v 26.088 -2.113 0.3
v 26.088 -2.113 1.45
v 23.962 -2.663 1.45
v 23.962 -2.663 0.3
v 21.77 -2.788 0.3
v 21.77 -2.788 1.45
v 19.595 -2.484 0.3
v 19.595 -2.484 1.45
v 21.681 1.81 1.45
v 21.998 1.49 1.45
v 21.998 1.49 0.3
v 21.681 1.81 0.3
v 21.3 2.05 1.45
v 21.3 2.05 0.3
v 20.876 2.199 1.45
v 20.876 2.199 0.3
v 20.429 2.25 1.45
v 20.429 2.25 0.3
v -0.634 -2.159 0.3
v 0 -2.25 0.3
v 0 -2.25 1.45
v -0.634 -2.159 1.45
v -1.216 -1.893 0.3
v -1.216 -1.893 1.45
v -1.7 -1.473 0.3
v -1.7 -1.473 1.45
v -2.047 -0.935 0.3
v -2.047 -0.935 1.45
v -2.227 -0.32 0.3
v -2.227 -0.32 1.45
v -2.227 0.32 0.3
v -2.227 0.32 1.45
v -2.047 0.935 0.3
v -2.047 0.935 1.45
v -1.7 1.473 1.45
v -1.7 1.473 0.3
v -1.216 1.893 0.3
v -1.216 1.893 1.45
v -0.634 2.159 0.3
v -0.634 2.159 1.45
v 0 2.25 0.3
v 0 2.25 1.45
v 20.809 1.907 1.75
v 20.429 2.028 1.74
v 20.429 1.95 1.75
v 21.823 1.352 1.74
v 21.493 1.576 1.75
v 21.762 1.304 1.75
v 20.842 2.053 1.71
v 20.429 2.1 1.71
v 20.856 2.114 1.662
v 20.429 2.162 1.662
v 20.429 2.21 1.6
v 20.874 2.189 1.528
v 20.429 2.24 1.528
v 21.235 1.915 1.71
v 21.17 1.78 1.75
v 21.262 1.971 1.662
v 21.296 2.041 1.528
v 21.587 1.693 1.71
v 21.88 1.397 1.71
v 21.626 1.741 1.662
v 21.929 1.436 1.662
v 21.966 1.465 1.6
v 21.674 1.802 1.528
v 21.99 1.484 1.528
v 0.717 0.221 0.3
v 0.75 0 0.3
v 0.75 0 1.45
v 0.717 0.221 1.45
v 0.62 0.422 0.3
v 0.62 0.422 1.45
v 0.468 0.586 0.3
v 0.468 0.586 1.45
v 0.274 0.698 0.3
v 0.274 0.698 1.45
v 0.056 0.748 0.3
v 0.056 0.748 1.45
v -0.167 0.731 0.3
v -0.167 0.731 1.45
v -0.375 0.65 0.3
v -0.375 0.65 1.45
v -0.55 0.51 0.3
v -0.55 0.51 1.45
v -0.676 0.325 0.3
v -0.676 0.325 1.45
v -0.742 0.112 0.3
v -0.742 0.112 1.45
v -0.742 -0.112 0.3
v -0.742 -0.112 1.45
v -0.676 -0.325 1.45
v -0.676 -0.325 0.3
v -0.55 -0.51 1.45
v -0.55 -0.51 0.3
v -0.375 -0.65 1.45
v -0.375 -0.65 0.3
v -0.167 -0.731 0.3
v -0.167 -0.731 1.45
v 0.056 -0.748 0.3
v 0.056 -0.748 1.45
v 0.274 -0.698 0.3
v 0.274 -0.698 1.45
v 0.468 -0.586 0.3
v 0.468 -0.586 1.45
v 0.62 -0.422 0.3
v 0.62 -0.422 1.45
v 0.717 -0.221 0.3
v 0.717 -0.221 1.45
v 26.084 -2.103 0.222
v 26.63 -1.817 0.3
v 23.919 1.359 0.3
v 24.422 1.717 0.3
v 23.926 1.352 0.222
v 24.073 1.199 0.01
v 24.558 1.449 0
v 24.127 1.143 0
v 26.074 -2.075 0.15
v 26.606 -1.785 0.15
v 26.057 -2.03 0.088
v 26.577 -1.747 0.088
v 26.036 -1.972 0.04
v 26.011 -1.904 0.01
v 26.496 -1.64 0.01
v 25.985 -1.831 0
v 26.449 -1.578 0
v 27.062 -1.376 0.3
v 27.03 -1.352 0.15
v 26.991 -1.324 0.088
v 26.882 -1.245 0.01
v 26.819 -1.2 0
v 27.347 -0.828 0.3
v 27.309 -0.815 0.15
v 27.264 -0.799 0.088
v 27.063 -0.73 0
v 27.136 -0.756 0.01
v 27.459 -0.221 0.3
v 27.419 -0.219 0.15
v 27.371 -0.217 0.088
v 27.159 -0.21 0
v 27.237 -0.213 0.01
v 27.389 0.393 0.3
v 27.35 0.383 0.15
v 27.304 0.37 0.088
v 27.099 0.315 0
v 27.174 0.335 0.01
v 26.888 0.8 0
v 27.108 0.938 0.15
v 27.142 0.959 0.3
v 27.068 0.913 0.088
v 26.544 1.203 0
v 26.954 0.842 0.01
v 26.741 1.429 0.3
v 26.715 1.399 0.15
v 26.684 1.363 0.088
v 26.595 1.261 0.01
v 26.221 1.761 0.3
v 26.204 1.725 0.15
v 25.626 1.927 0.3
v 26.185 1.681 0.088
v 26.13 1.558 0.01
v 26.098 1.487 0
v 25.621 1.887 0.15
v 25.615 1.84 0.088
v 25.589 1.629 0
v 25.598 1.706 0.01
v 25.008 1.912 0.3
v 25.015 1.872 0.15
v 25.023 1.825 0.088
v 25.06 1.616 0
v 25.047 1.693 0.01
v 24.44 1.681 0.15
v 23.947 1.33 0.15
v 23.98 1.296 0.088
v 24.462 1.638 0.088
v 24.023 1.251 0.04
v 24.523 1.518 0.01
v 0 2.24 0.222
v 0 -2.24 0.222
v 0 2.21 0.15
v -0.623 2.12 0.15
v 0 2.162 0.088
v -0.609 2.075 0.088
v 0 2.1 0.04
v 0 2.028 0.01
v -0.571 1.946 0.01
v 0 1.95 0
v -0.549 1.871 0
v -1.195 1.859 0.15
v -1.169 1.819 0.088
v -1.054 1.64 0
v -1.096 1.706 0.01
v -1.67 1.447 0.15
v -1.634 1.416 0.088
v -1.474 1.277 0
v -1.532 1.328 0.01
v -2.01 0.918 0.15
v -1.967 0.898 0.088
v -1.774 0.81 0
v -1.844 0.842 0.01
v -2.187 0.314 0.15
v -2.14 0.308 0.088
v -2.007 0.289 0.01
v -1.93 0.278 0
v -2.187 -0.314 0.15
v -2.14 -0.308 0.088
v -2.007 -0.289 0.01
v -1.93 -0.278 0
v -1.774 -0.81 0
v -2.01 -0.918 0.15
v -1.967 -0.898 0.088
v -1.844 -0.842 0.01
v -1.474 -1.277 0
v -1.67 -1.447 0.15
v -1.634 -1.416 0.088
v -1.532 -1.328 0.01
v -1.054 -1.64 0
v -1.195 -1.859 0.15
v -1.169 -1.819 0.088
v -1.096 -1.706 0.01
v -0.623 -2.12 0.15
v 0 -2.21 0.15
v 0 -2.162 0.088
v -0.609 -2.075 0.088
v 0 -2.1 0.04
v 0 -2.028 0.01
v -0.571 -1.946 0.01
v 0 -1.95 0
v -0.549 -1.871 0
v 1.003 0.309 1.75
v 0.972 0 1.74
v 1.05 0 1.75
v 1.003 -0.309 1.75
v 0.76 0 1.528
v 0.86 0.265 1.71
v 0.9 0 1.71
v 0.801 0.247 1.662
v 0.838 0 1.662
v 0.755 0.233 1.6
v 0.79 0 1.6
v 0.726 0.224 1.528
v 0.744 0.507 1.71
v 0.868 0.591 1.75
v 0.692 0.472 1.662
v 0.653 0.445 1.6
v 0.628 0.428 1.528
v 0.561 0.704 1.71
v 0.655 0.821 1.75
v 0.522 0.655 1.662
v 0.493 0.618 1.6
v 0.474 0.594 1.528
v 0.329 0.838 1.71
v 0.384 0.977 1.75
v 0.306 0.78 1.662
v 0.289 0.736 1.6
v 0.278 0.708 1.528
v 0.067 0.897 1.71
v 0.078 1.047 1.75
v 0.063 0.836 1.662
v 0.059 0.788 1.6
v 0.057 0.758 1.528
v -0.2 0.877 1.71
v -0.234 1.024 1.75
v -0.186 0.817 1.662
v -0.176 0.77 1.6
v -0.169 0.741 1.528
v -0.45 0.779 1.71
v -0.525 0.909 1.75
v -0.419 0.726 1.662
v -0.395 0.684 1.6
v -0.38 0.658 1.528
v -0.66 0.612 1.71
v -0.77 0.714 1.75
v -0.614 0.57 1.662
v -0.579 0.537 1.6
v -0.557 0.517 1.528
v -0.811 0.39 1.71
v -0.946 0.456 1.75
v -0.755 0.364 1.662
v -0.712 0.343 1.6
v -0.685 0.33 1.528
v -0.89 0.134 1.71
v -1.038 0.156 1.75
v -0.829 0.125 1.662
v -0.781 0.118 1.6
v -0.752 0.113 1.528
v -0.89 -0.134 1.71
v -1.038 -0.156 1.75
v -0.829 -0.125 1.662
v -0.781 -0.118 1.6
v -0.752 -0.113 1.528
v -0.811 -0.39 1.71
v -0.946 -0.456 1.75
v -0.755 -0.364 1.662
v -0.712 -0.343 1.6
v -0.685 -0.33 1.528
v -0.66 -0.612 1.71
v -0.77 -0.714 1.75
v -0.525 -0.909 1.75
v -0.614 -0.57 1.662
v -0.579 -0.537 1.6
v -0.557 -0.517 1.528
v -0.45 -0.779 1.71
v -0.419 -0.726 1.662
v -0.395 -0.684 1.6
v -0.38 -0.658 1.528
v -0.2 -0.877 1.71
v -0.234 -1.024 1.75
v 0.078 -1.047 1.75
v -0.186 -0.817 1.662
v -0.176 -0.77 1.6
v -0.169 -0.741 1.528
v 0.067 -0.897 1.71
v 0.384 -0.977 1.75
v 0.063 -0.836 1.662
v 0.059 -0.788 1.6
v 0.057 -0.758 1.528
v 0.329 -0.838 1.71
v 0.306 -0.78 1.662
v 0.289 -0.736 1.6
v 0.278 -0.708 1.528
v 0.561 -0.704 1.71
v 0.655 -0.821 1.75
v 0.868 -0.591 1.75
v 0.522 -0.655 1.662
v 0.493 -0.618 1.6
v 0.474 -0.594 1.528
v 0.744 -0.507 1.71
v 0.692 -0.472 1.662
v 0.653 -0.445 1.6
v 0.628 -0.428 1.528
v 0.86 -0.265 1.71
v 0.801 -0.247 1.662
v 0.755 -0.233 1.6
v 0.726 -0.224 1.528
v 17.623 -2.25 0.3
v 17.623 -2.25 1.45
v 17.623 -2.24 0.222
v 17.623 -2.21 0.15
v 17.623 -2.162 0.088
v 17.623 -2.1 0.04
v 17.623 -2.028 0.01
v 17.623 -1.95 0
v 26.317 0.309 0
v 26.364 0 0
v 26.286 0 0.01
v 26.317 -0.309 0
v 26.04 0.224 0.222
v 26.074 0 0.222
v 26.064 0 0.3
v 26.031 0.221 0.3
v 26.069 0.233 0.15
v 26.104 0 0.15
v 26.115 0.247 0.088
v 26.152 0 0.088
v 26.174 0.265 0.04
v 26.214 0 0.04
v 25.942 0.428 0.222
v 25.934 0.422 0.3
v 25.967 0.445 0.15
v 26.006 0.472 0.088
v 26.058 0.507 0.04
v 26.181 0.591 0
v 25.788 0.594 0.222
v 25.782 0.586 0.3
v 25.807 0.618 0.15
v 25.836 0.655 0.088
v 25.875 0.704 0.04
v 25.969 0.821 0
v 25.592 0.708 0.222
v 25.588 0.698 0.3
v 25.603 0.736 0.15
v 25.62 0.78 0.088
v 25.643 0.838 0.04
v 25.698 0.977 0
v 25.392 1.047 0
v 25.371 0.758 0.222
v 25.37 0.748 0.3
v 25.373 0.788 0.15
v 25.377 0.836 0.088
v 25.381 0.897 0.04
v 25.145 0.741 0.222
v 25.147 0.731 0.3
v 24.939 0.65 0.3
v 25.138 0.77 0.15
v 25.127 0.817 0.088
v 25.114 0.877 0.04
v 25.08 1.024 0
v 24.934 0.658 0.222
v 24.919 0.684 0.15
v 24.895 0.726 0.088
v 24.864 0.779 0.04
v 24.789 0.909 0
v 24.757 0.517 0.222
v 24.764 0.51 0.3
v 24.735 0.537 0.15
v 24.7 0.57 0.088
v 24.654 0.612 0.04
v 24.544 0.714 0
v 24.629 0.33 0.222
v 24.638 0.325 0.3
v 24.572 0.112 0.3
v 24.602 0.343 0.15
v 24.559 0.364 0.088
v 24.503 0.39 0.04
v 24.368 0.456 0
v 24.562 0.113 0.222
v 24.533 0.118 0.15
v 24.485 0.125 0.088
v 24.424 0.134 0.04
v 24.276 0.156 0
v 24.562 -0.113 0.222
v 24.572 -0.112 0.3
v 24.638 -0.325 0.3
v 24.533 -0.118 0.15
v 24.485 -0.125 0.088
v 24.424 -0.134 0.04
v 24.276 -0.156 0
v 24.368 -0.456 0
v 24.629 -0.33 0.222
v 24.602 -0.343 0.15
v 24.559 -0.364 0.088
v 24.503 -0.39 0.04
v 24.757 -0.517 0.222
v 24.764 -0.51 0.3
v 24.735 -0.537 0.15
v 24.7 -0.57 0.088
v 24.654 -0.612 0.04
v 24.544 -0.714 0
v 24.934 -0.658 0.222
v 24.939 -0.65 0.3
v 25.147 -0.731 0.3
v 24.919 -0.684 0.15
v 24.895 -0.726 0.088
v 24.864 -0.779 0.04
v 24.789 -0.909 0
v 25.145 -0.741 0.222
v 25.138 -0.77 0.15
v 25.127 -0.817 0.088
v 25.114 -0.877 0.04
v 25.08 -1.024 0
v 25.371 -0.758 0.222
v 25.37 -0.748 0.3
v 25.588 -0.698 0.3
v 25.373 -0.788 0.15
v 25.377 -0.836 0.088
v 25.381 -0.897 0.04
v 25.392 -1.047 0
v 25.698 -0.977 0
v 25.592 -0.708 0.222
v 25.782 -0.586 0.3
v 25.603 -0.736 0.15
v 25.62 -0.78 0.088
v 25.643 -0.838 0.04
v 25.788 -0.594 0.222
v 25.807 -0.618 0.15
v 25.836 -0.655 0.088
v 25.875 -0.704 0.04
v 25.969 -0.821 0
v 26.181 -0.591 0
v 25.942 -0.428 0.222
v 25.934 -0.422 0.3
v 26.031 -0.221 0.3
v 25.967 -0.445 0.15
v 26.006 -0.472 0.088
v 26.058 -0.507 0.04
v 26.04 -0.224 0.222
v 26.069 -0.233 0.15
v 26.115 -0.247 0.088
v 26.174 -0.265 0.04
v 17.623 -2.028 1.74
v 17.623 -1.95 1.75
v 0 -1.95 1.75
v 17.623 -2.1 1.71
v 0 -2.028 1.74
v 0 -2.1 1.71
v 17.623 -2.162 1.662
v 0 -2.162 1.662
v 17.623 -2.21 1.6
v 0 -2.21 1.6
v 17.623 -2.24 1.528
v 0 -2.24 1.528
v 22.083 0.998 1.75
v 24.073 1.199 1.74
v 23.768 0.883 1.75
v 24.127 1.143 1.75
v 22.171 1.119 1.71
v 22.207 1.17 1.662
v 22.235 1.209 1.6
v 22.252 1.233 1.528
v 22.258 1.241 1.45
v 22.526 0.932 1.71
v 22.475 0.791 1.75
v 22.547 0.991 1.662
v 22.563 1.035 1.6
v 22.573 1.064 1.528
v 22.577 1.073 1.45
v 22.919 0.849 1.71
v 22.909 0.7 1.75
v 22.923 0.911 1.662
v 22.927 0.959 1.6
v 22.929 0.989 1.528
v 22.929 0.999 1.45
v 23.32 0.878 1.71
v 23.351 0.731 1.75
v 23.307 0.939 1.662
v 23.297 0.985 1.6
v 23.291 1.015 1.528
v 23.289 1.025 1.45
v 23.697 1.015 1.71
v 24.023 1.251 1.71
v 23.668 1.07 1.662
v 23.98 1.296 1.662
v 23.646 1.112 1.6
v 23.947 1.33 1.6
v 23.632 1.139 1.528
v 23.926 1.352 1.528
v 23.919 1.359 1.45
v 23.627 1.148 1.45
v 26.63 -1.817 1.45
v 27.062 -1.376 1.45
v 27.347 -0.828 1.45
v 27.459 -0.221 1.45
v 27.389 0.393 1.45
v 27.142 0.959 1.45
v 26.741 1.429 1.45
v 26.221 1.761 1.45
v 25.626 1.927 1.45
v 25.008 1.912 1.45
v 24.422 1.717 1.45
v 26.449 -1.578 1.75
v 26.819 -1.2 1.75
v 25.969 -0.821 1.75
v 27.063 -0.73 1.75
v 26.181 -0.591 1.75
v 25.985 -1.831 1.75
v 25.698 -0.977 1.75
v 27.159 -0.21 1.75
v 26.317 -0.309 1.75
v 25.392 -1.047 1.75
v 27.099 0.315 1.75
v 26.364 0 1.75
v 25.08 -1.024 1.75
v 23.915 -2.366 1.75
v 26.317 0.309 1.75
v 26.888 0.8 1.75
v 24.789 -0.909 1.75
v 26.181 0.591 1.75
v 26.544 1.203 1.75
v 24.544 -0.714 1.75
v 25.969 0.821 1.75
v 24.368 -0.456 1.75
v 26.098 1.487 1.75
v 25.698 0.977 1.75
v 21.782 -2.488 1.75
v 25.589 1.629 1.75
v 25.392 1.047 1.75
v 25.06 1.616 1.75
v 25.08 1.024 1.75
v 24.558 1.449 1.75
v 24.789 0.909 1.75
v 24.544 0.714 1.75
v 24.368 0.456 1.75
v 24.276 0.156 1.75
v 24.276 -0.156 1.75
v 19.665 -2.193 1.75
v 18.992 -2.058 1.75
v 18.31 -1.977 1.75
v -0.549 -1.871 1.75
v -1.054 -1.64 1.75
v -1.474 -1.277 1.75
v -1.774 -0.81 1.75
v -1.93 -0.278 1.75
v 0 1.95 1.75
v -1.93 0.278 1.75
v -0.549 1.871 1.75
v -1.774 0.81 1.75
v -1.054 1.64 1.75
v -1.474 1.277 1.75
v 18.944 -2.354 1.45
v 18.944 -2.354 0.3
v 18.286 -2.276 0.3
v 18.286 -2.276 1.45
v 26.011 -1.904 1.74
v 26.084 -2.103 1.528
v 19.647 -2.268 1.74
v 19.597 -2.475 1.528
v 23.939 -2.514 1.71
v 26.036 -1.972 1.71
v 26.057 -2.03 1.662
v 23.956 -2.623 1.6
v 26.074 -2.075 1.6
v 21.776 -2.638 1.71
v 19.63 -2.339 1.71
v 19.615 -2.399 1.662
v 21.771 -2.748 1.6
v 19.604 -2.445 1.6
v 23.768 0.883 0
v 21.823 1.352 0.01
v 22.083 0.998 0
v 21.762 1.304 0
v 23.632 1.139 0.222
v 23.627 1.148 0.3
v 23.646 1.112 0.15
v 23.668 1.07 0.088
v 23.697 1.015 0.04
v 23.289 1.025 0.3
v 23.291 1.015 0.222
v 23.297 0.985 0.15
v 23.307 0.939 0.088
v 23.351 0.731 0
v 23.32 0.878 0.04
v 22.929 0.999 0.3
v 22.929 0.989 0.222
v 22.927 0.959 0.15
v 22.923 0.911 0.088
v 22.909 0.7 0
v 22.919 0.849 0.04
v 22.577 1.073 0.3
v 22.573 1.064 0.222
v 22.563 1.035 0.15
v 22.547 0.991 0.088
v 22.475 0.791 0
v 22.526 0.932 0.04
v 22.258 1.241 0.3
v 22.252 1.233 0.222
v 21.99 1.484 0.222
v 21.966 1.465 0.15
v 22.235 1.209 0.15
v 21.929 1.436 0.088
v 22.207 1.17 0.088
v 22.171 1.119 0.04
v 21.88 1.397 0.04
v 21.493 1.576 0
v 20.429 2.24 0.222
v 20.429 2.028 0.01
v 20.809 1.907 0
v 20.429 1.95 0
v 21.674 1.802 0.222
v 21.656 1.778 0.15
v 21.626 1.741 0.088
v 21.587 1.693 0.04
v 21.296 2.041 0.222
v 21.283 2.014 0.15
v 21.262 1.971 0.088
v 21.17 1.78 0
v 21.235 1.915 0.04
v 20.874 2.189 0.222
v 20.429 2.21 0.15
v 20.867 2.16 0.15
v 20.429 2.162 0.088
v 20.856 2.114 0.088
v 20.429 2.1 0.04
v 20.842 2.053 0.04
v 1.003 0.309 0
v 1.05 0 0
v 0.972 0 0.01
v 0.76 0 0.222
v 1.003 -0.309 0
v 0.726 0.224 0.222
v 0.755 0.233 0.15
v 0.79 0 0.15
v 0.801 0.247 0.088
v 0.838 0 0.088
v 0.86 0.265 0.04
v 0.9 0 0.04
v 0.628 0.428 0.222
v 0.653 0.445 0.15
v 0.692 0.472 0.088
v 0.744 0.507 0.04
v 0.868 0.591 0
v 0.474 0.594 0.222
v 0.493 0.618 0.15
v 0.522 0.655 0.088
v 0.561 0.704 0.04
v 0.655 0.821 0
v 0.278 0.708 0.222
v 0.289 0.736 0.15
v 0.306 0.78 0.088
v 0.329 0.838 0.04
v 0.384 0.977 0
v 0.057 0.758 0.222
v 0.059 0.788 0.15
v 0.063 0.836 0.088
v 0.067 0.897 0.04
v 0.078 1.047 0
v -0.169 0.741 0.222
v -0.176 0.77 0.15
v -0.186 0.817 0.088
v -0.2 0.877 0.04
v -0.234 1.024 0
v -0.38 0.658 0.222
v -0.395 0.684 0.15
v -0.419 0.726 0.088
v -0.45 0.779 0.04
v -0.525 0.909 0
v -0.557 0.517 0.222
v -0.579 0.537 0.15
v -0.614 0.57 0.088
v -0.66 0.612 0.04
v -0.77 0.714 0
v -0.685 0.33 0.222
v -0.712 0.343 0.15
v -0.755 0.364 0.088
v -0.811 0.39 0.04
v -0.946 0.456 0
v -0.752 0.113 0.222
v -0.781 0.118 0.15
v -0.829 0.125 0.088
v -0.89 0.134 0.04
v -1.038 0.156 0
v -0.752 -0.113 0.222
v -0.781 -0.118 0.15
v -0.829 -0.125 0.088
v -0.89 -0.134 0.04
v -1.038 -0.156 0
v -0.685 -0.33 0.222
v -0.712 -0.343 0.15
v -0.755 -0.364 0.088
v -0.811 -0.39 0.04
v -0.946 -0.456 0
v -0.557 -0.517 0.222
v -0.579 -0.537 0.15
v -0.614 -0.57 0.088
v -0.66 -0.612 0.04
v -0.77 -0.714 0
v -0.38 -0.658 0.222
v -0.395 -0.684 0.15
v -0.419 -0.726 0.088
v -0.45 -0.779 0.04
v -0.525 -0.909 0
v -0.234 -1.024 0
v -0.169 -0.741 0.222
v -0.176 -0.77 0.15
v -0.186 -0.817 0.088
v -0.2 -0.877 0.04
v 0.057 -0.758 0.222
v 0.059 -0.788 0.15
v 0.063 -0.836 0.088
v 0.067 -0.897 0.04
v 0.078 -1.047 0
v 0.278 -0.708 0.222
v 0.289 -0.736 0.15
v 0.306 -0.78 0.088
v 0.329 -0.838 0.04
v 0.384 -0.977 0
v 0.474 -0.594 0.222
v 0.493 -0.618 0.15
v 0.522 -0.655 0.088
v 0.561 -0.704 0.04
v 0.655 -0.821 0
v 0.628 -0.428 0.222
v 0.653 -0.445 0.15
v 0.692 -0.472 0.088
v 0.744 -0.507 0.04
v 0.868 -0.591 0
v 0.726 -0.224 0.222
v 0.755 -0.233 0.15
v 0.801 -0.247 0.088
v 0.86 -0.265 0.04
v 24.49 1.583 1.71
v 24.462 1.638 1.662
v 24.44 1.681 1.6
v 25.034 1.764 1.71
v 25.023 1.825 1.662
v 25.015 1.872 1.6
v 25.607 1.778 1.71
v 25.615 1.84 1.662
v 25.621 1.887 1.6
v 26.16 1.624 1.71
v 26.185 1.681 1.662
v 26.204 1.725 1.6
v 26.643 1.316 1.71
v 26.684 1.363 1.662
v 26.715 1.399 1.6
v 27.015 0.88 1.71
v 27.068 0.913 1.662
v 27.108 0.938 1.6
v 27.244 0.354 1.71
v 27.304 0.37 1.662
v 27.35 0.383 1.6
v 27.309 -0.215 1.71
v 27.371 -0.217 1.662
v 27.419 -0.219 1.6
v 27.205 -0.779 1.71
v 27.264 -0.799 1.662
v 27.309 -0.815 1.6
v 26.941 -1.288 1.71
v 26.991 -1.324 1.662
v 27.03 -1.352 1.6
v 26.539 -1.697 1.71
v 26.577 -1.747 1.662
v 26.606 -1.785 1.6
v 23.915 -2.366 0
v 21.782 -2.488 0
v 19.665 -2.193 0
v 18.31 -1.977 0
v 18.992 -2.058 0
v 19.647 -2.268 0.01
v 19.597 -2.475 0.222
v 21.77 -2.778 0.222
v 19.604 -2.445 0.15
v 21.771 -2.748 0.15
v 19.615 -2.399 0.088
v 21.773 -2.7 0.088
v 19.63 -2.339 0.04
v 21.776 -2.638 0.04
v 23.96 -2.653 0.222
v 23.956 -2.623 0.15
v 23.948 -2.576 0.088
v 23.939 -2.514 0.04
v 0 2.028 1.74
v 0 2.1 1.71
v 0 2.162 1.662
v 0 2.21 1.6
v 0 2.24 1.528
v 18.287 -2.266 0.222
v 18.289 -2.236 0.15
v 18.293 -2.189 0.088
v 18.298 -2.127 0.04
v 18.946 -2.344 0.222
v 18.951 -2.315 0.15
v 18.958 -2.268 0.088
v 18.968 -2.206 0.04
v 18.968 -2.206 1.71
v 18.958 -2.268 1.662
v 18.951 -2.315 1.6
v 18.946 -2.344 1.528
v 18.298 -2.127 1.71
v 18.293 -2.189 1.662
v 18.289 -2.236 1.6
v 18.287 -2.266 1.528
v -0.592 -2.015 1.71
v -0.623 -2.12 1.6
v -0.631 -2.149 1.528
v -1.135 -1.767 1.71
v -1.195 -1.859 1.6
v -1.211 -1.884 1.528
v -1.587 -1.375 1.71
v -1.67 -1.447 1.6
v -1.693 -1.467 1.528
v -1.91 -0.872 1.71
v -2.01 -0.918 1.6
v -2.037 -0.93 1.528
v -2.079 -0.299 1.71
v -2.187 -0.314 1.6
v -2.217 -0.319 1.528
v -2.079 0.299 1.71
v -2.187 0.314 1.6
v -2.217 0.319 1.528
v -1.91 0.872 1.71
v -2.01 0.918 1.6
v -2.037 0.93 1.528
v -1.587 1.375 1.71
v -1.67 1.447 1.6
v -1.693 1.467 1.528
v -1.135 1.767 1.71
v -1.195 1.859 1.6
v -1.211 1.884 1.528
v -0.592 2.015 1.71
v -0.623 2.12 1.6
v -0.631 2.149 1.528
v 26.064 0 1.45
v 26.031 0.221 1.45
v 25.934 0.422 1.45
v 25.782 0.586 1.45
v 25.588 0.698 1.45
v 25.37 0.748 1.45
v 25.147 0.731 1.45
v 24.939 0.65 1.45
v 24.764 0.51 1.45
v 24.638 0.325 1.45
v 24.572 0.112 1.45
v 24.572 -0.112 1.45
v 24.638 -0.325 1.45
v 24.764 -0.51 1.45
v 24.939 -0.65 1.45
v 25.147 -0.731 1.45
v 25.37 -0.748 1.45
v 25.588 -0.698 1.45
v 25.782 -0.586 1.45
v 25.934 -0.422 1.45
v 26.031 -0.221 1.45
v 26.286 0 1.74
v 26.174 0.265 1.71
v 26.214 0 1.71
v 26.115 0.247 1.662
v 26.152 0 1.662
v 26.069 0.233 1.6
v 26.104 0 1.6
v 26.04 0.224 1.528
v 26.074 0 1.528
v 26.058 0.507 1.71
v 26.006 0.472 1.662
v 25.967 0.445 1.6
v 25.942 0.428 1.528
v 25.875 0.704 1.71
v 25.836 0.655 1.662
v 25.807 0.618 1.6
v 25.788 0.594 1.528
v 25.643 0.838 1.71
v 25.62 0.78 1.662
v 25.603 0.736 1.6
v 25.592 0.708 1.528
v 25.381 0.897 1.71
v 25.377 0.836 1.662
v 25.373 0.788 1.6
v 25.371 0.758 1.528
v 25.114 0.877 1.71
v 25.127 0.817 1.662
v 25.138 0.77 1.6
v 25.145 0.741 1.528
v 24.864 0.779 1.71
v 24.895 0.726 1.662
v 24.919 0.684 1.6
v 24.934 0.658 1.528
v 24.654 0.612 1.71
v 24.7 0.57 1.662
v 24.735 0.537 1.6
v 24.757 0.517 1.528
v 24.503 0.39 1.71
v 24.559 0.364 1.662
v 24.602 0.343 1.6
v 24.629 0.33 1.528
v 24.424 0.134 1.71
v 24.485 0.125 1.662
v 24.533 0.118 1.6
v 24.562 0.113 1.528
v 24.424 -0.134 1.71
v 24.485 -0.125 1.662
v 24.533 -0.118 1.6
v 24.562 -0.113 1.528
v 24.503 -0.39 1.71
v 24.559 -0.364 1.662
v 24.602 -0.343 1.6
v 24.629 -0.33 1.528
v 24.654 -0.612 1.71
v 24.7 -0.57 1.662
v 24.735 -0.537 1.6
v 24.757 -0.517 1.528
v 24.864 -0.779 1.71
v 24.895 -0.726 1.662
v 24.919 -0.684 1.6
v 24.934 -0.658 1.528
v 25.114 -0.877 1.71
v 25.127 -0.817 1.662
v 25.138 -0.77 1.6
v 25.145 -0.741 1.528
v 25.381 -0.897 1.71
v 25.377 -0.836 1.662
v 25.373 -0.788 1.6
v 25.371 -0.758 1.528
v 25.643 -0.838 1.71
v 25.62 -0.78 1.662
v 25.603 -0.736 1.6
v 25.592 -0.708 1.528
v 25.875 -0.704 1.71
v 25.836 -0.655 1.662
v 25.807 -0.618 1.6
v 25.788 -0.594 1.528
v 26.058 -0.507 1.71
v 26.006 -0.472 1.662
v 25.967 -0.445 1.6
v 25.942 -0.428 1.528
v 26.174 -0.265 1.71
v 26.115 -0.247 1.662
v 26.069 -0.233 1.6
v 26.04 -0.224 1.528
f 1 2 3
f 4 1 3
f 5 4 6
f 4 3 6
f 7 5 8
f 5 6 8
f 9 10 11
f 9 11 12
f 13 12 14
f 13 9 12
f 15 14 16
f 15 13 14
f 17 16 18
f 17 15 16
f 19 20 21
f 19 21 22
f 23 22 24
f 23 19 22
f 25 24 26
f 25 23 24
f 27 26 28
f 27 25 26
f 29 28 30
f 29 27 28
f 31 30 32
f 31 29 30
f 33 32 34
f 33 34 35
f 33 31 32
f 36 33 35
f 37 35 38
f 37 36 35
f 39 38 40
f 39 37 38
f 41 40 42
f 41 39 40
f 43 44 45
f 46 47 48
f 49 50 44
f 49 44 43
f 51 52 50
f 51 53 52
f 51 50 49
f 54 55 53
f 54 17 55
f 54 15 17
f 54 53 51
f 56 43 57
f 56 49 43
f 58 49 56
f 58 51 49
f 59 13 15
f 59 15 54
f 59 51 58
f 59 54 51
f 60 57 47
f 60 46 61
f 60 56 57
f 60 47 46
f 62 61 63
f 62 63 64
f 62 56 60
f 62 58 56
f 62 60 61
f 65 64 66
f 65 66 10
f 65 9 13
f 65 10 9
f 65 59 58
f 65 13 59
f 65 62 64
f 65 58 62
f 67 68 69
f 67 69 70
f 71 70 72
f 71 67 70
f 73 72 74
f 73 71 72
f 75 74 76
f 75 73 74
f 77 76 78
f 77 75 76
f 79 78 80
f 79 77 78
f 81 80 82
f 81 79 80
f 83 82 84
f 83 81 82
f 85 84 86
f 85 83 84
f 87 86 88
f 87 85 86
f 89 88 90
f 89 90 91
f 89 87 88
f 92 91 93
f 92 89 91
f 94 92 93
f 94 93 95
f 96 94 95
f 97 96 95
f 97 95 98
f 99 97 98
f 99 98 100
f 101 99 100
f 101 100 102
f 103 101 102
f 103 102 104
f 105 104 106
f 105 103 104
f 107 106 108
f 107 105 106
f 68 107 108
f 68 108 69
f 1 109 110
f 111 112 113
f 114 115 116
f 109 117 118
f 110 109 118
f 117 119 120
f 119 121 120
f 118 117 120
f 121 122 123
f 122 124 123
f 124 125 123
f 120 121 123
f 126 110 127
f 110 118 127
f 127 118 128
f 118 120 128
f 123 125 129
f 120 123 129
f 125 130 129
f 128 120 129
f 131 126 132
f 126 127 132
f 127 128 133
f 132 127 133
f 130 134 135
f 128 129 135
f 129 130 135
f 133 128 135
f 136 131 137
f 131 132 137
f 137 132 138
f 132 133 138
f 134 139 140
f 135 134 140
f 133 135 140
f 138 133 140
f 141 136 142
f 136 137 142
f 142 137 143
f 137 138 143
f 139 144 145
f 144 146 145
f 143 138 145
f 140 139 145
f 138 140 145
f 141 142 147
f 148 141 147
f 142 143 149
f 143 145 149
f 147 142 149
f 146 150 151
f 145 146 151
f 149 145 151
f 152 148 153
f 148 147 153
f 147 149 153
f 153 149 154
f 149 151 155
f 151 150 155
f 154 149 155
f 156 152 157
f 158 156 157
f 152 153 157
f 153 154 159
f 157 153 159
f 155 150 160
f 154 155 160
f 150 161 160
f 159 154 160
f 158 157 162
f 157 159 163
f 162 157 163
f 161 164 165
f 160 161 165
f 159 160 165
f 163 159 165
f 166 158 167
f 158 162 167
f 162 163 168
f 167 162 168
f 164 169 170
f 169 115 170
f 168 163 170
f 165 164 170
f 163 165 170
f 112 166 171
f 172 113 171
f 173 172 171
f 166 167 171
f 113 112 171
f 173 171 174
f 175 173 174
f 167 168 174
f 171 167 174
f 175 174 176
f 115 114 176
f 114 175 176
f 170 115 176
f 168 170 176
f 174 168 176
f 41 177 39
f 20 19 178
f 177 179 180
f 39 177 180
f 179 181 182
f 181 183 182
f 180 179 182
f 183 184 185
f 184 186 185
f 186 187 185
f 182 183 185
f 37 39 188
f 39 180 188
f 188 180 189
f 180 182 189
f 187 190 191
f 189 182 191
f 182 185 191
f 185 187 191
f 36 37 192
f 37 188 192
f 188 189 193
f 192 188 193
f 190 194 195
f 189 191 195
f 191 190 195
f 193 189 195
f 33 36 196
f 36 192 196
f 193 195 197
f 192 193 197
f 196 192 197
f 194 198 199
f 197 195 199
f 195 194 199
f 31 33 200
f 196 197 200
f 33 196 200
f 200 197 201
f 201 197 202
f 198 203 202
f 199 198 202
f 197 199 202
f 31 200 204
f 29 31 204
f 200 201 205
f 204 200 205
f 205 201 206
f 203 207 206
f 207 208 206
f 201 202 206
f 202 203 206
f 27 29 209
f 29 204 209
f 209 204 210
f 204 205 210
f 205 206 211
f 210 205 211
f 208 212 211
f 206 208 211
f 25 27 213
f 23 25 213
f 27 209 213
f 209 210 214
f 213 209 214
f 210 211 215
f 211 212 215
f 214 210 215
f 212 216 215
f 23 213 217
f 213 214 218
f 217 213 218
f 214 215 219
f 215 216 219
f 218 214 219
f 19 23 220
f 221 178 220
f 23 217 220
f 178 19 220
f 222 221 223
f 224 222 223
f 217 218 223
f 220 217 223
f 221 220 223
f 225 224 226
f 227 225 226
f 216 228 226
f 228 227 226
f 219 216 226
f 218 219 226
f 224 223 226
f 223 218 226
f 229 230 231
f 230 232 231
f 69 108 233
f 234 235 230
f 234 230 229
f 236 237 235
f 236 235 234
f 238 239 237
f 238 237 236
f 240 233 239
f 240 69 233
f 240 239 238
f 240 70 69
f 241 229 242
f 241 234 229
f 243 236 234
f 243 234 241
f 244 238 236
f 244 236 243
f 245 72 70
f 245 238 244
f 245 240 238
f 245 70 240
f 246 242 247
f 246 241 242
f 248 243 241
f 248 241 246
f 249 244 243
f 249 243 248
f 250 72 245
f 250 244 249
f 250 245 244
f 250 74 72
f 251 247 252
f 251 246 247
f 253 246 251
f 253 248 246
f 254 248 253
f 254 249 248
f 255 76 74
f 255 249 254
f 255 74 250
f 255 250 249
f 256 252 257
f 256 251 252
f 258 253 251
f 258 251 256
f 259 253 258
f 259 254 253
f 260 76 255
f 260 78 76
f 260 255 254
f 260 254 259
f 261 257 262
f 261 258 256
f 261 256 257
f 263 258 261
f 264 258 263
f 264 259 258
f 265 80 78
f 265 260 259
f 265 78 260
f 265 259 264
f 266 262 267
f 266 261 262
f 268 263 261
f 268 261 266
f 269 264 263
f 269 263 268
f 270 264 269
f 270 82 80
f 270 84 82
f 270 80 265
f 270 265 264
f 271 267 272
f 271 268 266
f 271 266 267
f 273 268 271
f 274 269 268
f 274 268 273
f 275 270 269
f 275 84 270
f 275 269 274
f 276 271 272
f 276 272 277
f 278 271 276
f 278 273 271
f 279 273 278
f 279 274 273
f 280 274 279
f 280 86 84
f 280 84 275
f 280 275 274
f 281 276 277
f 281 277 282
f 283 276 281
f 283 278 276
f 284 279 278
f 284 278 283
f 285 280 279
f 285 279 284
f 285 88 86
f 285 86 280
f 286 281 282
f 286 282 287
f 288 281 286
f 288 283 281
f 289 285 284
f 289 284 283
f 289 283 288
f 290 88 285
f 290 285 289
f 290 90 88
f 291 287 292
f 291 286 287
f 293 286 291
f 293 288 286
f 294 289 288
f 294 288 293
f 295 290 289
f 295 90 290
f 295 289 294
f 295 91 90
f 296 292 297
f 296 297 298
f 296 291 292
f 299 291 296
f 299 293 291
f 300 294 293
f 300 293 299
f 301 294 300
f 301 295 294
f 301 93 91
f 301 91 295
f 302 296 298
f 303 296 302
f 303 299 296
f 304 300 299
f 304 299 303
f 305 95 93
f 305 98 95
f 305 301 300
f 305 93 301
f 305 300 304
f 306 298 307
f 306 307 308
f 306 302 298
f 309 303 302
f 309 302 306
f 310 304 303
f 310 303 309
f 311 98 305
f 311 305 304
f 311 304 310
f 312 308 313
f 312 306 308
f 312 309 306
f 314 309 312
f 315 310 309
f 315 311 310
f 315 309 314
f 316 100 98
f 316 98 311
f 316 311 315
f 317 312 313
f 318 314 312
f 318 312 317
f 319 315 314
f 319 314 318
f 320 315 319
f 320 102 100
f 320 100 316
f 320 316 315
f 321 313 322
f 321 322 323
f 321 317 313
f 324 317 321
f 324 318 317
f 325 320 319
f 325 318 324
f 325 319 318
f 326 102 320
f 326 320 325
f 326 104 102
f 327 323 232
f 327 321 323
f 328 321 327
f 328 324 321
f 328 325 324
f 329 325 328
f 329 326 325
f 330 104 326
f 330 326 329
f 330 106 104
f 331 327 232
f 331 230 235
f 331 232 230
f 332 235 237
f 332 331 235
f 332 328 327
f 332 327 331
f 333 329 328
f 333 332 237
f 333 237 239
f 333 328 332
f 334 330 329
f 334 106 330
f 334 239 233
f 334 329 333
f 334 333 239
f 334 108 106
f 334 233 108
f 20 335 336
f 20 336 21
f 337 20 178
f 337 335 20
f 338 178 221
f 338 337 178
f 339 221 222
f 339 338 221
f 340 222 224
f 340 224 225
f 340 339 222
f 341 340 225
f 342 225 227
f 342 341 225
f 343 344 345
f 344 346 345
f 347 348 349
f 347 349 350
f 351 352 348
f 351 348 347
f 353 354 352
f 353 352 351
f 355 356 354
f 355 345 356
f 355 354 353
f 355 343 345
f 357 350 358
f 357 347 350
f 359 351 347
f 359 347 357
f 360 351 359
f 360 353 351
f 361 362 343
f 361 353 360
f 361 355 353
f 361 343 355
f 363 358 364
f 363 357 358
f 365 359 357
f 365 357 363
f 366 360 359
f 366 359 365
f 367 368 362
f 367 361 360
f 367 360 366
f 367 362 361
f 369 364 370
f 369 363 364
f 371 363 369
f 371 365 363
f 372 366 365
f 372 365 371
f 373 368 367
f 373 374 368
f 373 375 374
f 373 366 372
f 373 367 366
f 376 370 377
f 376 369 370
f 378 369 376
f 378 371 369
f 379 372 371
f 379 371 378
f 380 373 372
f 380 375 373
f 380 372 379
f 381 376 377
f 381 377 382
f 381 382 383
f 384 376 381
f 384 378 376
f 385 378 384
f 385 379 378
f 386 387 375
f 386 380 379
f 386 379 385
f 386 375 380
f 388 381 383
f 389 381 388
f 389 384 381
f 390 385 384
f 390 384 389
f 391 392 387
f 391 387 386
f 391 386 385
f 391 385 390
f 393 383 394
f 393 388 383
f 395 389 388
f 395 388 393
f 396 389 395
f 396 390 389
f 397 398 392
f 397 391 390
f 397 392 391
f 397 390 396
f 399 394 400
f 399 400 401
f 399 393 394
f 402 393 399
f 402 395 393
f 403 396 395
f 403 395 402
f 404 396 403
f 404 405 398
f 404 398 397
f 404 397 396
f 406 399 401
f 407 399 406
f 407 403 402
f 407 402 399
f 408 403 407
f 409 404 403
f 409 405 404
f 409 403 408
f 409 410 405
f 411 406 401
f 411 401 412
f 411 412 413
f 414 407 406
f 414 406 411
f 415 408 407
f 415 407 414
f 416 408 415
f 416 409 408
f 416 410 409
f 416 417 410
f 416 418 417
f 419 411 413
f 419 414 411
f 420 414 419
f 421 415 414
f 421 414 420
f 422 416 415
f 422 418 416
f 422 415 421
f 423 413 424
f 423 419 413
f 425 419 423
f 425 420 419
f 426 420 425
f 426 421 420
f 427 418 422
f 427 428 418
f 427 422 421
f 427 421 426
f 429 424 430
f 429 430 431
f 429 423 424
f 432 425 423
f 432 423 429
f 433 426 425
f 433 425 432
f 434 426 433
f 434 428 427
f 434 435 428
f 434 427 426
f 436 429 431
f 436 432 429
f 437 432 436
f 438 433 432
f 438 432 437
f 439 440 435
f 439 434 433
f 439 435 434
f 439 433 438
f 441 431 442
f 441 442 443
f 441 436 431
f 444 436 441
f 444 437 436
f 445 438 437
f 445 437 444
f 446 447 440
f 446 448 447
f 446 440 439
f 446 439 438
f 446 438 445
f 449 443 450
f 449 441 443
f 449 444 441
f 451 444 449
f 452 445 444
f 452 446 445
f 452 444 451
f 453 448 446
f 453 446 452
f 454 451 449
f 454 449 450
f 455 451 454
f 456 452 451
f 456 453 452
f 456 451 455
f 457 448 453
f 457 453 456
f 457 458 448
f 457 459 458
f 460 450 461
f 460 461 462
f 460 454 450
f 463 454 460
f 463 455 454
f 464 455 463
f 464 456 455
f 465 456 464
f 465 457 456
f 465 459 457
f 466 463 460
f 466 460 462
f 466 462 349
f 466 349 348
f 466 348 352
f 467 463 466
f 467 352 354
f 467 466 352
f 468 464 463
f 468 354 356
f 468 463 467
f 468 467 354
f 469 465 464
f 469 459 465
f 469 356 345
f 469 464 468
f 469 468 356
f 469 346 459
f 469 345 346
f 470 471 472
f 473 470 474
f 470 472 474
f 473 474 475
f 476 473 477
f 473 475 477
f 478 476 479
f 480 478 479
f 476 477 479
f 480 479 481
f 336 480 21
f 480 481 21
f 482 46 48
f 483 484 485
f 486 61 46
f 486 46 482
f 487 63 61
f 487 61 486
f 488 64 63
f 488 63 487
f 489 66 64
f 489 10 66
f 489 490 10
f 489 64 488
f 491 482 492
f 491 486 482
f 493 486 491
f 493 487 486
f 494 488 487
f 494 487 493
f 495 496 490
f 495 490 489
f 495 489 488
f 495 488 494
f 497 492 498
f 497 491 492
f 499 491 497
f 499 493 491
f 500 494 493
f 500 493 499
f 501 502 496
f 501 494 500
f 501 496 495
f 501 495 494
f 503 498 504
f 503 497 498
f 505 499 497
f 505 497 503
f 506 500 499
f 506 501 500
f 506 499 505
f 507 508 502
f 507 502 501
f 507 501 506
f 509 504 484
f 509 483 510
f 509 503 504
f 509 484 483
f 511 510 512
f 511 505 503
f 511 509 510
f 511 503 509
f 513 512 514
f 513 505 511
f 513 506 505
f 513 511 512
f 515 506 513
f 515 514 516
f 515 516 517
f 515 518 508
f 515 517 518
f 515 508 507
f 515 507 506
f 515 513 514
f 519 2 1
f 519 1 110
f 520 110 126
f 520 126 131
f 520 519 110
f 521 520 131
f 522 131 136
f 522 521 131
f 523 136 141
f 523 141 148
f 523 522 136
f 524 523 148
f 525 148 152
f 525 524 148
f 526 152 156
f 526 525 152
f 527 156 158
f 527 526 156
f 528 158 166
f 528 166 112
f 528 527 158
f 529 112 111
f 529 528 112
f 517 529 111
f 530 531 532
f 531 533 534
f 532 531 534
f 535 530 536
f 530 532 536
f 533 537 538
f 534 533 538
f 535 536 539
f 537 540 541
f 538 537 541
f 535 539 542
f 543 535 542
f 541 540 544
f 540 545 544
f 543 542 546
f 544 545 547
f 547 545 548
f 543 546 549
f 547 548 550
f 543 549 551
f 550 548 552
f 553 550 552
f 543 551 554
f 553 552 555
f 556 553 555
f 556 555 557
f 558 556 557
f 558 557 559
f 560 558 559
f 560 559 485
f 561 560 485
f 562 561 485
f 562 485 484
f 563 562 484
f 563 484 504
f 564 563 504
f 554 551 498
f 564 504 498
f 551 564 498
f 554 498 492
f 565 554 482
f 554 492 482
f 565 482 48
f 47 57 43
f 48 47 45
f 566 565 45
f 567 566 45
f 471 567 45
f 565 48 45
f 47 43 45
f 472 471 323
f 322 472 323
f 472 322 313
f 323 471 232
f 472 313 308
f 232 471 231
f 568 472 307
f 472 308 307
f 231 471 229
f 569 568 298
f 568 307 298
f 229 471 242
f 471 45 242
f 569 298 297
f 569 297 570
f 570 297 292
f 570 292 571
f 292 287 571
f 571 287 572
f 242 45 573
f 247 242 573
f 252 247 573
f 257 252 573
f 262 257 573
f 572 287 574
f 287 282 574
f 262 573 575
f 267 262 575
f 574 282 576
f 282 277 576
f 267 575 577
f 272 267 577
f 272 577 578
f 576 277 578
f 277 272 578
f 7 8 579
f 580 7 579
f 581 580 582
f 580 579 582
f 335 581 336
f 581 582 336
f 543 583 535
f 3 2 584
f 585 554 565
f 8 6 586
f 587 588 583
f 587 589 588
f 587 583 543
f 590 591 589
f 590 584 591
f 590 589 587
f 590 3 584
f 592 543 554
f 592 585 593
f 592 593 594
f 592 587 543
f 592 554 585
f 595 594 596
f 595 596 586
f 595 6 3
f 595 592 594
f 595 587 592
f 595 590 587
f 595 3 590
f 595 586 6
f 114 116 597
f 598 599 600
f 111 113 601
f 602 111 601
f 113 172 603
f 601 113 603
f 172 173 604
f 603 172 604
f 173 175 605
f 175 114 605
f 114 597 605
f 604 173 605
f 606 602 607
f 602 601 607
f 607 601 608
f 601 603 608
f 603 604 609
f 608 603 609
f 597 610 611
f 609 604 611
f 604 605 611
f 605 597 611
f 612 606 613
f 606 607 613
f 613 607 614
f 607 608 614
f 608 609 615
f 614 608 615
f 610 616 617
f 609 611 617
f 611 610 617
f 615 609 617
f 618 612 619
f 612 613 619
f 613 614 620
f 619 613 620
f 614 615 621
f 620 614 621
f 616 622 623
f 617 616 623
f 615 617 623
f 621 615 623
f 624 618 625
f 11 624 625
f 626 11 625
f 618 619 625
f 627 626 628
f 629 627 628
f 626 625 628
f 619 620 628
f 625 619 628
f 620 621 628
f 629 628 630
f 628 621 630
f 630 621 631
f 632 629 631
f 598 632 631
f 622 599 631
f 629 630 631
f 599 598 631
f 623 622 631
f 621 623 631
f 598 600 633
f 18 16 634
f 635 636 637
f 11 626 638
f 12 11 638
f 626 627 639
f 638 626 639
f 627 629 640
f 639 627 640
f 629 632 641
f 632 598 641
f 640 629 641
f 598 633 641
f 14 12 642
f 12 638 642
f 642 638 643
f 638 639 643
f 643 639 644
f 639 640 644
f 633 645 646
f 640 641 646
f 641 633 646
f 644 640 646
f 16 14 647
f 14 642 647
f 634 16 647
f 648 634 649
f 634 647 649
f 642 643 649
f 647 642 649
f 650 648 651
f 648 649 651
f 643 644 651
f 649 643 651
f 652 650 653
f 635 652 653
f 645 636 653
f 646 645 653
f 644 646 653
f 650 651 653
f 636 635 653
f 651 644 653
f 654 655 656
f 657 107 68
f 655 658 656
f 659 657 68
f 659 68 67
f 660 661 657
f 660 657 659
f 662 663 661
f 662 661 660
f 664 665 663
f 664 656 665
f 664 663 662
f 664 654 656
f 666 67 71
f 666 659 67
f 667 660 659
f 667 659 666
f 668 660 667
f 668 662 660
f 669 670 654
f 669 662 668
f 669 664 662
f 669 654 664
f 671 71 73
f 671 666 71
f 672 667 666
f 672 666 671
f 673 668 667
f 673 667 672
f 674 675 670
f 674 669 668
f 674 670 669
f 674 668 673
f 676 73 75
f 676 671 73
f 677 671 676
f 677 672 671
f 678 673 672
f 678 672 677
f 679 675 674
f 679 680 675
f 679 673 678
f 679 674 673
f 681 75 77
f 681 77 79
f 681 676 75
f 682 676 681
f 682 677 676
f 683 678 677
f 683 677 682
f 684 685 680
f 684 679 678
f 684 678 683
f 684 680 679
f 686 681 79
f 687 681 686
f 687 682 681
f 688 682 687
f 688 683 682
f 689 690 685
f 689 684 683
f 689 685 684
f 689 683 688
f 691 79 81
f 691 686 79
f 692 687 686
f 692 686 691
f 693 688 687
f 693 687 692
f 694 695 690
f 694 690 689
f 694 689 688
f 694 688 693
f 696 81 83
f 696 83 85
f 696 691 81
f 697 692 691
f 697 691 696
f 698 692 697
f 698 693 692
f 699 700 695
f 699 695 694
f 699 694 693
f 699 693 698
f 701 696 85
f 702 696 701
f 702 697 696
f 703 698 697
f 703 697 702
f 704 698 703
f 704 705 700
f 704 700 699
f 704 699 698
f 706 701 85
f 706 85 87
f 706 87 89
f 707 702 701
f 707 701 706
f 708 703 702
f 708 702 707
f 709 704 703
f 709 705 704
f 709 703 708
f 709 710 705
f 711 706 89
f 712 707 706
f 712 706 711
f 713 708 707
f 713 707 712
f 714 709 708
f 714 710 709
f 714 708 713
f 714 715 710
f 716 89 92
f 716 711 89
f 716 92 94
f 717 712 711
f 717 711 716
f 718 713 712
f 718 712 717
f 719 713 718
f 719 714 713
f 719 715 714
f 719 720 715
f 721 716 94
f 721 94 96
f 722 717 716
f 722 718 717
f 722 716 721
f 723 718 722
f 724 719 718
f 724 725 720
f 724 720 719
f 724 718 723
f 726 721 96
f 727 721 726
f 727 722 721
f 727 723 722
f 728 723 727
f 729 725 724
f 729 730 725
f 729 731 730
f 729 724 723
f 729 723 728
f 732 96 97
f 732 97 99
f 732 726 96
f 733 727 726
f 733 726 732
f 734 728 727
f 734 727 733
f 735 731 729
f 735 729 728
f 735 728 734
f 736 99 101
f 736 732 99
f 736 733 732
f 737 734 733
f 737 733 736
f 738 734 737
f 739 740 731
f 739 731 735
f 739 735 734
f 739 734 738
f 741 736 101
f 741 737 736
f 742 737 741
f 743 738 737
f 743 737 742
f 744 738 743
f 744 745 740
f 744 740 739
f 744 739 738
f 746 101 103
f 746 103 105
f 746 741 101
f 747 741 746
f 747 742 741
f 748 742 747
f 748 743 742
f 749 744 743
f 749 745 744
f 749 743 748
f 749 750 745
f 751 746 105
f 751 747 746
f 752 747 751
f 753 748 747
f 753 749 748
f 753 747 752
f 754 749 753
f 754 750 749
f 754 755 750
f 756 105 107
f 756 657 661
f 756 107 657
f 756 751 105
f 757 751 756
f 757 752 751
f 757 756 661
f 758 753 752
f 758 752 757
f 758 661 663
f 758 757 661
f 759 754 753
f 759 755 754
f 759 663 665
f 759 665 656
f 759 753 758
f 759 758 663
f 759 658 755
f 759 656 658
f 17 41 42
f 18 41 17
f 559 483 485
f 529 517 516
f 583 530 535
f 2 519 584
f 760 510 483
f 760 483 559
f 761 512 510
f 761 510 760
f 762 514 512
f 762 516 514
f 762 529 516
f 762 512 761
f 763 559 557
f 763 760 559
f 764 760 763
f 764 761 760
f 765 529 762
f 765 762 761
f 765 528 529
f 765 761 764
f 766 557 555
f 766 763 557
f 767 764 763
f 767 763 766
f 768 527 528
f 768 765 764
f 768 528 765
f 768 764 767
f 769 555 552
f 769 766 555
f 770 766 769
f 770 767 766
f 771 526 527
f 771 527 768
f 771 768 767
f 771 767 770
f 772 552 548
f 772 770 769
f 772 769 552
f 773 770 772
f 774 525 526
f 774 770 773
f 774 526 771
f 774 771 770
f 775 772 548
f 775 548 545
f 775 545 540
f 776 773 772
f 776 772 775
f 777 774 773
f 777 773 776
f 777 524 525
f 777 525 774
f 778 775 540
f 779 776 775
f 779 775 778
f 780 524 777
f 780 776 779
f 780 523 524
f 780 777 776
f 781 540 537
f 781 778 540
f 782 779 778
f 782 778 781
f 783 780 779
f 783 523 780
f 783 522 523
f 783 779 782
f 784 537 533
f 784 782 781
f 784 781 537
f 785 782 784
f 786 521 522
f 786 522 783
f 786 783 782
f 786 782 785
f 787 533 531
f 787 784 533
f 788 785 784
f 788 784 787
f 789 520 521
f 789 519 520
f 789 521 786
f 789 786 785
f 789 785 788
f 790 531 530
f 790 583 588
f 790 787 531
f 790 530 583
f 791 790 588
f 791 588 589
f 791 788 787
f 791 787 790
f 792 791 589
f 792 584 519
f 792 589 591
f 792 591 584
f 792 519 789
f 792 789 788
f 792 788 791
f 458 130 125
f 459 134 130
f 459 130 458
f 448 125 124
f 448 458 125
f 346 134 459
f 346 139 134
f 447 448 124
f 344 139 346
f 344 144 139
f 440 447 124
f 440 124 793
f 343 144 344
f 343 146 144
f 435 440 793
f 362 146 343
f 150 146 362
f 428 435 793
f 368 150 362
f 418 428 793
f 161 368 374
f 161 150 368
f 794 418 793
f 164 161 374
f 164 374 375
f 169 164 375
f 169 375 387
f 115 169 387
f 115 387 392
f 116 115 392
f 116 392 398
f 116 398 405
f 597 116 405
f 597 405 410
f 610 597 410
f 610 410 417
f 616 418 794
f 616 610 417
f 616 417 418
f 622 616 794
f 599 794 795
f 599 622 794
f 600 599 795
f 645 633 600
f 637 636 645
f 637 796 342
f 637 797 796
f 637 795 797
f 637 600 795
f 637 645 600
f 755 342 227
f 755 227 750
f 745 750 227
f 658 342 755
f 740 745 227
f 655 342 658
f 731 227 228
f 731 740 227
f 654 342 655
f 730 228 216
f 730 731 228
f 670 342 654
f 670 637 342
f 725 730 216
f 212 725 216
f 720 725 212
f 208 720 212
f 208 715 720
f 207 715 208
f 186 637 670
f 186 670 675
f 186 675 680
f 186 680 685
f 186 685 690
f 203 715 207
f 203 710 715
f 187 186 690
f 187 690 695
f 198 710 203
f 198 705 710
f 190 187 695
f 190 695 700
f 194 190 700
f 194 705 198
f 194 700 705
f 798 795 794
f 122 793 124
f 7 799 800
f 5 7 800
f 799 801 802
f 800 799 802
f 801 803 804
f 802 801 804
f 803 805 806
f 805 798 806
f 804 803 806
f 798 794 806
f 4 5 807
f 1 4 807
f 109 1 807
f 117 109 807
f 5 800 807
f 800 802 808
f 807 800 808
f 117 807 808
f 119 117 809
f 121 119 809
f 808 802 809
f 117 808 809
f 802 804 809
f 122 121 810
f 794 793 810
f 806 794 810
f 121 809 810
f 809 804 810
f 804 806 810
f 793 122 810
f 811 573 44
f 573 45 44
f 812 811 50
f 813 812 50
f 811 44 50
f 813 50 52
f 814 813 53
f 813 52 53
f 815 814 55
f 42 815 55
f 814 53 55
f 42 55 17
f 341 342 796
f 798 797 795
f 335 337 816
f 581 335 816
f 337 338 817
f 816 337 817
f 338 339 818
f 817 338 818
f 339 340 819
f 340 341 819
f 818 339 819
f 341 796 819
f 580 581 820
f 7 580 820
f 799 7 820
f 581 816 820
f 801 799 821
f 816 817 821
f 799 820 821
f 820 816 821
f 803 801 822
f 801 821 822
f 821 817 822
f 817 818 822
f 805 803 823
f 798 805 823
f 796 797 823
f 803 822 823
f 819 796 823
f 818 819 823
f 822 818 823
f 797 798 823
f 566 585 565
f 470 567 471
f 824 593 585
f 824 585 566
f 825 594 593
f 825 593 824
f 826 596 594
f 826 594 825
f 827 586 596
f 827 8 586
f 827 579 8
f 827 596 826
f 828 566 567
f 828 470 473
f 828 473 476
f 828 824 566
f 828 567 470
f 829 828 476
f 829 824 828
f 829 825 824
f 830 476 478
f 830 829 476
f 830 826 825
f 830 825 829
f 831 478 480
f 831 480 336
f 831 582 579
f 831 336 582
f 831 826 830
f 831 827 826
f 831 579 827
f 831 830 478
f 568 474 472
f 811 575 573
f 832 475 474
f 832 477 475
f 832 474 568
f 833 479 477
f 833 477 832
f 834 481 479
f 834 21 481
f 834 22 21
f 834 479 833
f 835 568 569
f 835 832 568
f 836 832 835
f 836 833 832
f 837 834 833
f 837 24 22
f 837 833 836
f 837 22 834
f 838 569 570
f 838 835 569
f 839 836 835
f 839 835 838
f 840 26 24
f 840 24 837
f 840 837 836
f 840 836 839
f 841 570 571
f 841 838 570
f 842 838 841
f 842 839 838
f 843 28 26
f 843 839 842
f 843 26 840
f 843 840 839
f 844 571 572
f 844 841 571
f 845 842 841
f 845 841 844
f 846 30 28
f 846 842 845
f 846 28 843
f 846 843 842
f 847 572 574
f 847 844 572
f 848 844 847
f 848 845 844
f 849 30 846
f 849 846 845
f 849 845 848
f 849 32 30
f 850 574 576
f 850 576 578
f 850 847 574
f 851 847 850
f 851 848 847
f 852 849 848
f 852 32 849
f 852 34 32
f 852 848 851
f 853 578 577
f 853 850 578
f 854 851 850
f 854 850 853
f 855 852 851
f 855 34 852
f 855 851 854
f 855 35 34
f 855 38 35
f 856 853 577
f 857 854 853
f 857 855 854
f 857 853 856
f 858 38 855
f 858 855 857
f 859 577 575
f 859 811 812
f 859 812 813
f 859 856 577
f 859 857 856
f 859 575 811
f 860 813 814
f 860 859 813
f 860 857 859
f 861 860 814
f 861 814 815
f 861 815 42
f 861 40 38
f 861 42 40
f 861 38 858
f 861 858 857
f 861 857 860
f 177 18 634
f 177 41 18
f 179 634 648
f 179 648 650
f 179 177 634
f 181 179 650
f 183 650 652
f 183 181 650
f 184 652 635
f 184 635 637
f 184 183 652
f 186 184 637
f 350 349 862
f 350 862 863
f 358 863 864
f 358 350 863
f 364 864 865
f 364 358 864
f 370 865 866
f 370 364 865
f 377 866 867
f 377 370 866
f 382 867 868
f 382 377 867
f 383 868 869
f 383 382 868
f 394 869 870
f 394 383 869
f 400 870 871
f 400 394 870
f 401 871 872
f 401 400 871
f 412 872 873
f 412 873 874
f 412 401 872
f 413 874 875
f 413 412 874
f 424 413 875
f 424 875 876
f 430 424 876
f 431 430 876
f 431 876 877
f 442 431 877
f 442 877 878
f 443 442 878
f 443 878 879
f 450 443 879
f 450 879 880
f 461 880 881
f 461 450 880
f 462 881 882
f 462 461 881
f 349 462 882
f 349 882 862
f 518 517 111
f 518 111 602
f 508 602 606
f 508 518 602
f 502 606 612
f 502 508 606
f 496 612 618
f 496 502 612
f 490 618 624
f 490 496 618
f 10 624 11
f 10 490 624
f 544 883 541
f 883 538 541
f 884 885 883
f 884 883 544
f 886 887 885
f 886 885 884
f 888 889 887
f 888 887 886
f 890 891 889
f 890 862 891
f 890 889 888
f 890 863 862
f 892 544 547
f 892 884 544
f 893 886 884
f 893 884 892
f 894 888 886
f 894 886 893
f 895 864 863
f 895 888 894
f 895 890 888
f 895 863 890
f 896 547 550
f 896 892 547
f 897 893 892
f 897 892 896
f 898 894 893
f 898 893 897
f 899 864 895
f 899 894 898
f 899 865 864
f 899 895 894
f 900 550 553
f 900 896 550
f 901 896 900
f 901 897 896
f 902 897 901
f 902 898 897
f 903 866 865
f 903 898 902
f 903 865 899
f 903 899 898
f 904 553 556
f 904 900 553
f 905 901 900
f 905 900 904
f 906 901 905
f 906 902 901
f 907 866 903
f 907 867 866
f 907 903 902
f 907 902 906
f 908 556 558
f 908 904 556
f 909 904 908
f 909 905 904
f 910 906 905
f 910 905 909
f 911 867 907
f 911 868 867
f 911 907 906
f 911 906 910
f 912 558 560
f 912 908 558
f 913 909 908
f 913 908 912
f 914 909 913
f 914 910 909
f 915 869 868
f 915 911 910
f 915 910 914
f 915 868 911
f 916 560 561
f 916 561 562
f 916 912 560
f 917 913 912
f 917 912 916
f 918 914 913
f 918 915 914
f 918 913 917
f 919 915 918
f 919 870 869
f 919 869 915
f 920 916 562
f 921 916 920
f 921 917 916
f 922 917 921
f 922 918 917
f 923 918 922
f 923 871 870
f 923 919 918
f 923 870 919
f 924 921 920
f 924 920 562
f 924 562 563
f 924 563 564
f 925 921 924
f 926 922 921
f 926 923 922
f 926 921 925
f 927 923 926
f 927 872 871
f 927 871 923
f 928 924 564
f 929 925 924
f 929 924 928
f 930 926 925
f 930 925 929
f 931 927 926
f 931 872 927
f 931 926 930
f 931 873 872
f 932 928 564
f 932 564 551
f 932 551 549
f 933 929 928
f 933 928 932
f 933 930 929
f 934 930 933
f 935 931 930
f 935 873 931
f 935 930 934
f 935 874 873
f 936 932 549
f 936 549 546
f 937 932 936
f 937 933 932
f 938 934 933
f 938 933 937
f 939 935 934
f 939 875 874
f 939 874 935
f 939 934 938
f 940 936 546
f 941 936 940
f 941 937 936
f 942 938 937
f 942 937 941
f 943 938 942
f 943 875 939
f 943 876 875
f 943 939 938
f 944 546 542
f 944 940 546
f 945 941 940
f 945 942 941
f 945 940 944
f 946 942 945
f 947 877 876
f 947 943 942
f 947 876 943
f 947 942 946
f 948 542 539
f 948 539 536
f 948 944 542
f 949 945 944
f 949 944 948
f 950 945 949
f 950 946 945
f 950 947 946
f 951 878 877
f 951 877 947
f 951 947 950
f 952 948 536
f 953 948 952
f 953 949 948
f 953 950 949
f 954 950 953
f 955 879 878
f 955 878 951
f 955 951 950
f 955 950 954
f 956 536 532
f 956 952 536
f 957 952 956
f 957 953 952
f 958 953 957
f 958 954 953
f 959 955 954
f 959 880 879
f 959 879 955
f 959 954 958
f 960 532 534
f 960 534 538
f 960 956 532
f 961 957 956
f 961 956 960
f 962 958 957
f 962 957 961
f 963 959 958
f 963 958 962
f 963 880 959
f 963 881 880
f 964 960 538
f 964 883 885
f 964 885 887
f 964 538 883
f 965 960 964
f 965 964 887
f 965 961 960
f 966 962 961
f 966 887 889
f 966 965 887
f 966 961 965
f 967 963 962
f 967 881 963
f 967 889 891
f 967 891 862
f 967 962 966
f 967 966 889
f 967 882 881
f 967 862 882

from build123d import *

# Parameters (mm, degrees)
SKETCH1_R           = 0.75
BOSS_EXTRUDE1_DEPTH = 1.75
CUT_EXTRUDE1_DEPTH  = 2.75
BOSS_EXTRUDE2_DEPTH = 1.75
FILLET1_R           = 0.3


with BuildPart() as part:
    # Sketch1 → Boss-Extrude1 (new body)
    with BuildSketch(Plane.XY):
        with BuildLine():
            Line((0, 2.25), (25.3139123, 2.25))
            ThreePointArc((25.3139123, 2.25), (27.5639123, 0), (25.3139123, -2.25))
            Line((25.3139123, -2.25), (0, -2.25))
            ThreePointArc((0, -2.25), (-2.25, 0), (0, 2.25))
        make_face()
        Circle(SKETCH1_R, mode=Mode.SUBTRACT)
        with Locations((25.3139123, 0)):
            Circle(SKETCH1_R, mode=Mode.SUBTRACT)
    extrude(amount=BOSS_EXTRUDE1_DEPTH)

    # Sketch3 → Cut-Extrude1 (cut, through all)
    with BuildSketch(Plane.XY.offset(1.75)):
        with BuildLine():
            Line((20.428705222, 2.25), (19.342677146, 2.25))
            Line((19.342677146, 2.25), (23.387436759, 7.422260387))
            Line((23.387436759, 7.422260387), (32.371586903, 3.422864517))
            Line((32.371586903, 3.422864517), (28.657239067, -4.174979021))
            Line((28.657239067, -4.174979021), (25.048377489, -2.234276452))
            ThreePointArc((25.048377489, -2.234276452), (25.575200601, -2.234777041), (26.087699031, -2.112759829))
            ThreePointArc((26.087699031, -2.112759829), (27.142254835, 0.959406624), (23.918802571, 1.358969087))
            ThreePointArc((23.918802571, 1.358969087), (22.929300966, 0.999117226), (21.997860665, 1.490060964))
            ThreePointArc((21.997860665, 1.490060964), (21.300450044, 2.050016934), (20.428705222, 2.25))
        make_face()
    extrude(amount=-CUT_EXTRUDE1_DEPTH, mode=Mode.SUBTRACT)

    # Sketch4 → Boss-Extrude2 (add)
    with BuildSketch(Plane.XY.offset(1.75)):
        with BuildLine():
            Line((17.62318329, -2.25), (26.087699031, -2.112759829))
            ThreePointArc((26.087699031, -2.112759829), (22.868792436, -2.779110617), (19.594871531, -2.484449879))
            ThreePointArc((19.594871531, -2.484449879), (18.61597245, -2.308818201), (17.62318329, -2.25))
        make_face()
    extrude(amount=-BOSS_EXTRUDE2_DEPTH)

    # Fillet1
    fillet1_edges = [part.edges().sort_by_distance(p)[0] for p in [
        (-0.75, 0, 0),
        (-0.75, 0, 1.75),
        (24.5639123, 0, 0),
        (24.5639123, 0, 1.75),
        (10.214352611, 2.25, 0),
        (10.214352611, 2.25, 1.75),
        (27.142254835, 0.959406624, 1.75),
        (21.300450044, 2.050016934, 1.75),
        (22.929300966, 0.999117226, 1.75),
        (27.142254835, 0.959406624, 0),
        (22.929300966, 0.999117226, 0),
        (21.300450044, 2.050016934, 0),
        (-2.25, 0, 1.75),
        (8.811591645, -2.25, 0),
        (-2.25, 0, 0),
        (18.61597245, -2.308818201, 1.75),
        (22.868792436, -2.779110617, 1.75),
        (22.868792436, -2.779110617, 0),
        (18.61597245, -2.308818201, 0),
        (8.811591645, -2.25, 1.75),
    ]]
    fillet(fillet1_edges, radius=FILLET1_R)


solid = part.part
